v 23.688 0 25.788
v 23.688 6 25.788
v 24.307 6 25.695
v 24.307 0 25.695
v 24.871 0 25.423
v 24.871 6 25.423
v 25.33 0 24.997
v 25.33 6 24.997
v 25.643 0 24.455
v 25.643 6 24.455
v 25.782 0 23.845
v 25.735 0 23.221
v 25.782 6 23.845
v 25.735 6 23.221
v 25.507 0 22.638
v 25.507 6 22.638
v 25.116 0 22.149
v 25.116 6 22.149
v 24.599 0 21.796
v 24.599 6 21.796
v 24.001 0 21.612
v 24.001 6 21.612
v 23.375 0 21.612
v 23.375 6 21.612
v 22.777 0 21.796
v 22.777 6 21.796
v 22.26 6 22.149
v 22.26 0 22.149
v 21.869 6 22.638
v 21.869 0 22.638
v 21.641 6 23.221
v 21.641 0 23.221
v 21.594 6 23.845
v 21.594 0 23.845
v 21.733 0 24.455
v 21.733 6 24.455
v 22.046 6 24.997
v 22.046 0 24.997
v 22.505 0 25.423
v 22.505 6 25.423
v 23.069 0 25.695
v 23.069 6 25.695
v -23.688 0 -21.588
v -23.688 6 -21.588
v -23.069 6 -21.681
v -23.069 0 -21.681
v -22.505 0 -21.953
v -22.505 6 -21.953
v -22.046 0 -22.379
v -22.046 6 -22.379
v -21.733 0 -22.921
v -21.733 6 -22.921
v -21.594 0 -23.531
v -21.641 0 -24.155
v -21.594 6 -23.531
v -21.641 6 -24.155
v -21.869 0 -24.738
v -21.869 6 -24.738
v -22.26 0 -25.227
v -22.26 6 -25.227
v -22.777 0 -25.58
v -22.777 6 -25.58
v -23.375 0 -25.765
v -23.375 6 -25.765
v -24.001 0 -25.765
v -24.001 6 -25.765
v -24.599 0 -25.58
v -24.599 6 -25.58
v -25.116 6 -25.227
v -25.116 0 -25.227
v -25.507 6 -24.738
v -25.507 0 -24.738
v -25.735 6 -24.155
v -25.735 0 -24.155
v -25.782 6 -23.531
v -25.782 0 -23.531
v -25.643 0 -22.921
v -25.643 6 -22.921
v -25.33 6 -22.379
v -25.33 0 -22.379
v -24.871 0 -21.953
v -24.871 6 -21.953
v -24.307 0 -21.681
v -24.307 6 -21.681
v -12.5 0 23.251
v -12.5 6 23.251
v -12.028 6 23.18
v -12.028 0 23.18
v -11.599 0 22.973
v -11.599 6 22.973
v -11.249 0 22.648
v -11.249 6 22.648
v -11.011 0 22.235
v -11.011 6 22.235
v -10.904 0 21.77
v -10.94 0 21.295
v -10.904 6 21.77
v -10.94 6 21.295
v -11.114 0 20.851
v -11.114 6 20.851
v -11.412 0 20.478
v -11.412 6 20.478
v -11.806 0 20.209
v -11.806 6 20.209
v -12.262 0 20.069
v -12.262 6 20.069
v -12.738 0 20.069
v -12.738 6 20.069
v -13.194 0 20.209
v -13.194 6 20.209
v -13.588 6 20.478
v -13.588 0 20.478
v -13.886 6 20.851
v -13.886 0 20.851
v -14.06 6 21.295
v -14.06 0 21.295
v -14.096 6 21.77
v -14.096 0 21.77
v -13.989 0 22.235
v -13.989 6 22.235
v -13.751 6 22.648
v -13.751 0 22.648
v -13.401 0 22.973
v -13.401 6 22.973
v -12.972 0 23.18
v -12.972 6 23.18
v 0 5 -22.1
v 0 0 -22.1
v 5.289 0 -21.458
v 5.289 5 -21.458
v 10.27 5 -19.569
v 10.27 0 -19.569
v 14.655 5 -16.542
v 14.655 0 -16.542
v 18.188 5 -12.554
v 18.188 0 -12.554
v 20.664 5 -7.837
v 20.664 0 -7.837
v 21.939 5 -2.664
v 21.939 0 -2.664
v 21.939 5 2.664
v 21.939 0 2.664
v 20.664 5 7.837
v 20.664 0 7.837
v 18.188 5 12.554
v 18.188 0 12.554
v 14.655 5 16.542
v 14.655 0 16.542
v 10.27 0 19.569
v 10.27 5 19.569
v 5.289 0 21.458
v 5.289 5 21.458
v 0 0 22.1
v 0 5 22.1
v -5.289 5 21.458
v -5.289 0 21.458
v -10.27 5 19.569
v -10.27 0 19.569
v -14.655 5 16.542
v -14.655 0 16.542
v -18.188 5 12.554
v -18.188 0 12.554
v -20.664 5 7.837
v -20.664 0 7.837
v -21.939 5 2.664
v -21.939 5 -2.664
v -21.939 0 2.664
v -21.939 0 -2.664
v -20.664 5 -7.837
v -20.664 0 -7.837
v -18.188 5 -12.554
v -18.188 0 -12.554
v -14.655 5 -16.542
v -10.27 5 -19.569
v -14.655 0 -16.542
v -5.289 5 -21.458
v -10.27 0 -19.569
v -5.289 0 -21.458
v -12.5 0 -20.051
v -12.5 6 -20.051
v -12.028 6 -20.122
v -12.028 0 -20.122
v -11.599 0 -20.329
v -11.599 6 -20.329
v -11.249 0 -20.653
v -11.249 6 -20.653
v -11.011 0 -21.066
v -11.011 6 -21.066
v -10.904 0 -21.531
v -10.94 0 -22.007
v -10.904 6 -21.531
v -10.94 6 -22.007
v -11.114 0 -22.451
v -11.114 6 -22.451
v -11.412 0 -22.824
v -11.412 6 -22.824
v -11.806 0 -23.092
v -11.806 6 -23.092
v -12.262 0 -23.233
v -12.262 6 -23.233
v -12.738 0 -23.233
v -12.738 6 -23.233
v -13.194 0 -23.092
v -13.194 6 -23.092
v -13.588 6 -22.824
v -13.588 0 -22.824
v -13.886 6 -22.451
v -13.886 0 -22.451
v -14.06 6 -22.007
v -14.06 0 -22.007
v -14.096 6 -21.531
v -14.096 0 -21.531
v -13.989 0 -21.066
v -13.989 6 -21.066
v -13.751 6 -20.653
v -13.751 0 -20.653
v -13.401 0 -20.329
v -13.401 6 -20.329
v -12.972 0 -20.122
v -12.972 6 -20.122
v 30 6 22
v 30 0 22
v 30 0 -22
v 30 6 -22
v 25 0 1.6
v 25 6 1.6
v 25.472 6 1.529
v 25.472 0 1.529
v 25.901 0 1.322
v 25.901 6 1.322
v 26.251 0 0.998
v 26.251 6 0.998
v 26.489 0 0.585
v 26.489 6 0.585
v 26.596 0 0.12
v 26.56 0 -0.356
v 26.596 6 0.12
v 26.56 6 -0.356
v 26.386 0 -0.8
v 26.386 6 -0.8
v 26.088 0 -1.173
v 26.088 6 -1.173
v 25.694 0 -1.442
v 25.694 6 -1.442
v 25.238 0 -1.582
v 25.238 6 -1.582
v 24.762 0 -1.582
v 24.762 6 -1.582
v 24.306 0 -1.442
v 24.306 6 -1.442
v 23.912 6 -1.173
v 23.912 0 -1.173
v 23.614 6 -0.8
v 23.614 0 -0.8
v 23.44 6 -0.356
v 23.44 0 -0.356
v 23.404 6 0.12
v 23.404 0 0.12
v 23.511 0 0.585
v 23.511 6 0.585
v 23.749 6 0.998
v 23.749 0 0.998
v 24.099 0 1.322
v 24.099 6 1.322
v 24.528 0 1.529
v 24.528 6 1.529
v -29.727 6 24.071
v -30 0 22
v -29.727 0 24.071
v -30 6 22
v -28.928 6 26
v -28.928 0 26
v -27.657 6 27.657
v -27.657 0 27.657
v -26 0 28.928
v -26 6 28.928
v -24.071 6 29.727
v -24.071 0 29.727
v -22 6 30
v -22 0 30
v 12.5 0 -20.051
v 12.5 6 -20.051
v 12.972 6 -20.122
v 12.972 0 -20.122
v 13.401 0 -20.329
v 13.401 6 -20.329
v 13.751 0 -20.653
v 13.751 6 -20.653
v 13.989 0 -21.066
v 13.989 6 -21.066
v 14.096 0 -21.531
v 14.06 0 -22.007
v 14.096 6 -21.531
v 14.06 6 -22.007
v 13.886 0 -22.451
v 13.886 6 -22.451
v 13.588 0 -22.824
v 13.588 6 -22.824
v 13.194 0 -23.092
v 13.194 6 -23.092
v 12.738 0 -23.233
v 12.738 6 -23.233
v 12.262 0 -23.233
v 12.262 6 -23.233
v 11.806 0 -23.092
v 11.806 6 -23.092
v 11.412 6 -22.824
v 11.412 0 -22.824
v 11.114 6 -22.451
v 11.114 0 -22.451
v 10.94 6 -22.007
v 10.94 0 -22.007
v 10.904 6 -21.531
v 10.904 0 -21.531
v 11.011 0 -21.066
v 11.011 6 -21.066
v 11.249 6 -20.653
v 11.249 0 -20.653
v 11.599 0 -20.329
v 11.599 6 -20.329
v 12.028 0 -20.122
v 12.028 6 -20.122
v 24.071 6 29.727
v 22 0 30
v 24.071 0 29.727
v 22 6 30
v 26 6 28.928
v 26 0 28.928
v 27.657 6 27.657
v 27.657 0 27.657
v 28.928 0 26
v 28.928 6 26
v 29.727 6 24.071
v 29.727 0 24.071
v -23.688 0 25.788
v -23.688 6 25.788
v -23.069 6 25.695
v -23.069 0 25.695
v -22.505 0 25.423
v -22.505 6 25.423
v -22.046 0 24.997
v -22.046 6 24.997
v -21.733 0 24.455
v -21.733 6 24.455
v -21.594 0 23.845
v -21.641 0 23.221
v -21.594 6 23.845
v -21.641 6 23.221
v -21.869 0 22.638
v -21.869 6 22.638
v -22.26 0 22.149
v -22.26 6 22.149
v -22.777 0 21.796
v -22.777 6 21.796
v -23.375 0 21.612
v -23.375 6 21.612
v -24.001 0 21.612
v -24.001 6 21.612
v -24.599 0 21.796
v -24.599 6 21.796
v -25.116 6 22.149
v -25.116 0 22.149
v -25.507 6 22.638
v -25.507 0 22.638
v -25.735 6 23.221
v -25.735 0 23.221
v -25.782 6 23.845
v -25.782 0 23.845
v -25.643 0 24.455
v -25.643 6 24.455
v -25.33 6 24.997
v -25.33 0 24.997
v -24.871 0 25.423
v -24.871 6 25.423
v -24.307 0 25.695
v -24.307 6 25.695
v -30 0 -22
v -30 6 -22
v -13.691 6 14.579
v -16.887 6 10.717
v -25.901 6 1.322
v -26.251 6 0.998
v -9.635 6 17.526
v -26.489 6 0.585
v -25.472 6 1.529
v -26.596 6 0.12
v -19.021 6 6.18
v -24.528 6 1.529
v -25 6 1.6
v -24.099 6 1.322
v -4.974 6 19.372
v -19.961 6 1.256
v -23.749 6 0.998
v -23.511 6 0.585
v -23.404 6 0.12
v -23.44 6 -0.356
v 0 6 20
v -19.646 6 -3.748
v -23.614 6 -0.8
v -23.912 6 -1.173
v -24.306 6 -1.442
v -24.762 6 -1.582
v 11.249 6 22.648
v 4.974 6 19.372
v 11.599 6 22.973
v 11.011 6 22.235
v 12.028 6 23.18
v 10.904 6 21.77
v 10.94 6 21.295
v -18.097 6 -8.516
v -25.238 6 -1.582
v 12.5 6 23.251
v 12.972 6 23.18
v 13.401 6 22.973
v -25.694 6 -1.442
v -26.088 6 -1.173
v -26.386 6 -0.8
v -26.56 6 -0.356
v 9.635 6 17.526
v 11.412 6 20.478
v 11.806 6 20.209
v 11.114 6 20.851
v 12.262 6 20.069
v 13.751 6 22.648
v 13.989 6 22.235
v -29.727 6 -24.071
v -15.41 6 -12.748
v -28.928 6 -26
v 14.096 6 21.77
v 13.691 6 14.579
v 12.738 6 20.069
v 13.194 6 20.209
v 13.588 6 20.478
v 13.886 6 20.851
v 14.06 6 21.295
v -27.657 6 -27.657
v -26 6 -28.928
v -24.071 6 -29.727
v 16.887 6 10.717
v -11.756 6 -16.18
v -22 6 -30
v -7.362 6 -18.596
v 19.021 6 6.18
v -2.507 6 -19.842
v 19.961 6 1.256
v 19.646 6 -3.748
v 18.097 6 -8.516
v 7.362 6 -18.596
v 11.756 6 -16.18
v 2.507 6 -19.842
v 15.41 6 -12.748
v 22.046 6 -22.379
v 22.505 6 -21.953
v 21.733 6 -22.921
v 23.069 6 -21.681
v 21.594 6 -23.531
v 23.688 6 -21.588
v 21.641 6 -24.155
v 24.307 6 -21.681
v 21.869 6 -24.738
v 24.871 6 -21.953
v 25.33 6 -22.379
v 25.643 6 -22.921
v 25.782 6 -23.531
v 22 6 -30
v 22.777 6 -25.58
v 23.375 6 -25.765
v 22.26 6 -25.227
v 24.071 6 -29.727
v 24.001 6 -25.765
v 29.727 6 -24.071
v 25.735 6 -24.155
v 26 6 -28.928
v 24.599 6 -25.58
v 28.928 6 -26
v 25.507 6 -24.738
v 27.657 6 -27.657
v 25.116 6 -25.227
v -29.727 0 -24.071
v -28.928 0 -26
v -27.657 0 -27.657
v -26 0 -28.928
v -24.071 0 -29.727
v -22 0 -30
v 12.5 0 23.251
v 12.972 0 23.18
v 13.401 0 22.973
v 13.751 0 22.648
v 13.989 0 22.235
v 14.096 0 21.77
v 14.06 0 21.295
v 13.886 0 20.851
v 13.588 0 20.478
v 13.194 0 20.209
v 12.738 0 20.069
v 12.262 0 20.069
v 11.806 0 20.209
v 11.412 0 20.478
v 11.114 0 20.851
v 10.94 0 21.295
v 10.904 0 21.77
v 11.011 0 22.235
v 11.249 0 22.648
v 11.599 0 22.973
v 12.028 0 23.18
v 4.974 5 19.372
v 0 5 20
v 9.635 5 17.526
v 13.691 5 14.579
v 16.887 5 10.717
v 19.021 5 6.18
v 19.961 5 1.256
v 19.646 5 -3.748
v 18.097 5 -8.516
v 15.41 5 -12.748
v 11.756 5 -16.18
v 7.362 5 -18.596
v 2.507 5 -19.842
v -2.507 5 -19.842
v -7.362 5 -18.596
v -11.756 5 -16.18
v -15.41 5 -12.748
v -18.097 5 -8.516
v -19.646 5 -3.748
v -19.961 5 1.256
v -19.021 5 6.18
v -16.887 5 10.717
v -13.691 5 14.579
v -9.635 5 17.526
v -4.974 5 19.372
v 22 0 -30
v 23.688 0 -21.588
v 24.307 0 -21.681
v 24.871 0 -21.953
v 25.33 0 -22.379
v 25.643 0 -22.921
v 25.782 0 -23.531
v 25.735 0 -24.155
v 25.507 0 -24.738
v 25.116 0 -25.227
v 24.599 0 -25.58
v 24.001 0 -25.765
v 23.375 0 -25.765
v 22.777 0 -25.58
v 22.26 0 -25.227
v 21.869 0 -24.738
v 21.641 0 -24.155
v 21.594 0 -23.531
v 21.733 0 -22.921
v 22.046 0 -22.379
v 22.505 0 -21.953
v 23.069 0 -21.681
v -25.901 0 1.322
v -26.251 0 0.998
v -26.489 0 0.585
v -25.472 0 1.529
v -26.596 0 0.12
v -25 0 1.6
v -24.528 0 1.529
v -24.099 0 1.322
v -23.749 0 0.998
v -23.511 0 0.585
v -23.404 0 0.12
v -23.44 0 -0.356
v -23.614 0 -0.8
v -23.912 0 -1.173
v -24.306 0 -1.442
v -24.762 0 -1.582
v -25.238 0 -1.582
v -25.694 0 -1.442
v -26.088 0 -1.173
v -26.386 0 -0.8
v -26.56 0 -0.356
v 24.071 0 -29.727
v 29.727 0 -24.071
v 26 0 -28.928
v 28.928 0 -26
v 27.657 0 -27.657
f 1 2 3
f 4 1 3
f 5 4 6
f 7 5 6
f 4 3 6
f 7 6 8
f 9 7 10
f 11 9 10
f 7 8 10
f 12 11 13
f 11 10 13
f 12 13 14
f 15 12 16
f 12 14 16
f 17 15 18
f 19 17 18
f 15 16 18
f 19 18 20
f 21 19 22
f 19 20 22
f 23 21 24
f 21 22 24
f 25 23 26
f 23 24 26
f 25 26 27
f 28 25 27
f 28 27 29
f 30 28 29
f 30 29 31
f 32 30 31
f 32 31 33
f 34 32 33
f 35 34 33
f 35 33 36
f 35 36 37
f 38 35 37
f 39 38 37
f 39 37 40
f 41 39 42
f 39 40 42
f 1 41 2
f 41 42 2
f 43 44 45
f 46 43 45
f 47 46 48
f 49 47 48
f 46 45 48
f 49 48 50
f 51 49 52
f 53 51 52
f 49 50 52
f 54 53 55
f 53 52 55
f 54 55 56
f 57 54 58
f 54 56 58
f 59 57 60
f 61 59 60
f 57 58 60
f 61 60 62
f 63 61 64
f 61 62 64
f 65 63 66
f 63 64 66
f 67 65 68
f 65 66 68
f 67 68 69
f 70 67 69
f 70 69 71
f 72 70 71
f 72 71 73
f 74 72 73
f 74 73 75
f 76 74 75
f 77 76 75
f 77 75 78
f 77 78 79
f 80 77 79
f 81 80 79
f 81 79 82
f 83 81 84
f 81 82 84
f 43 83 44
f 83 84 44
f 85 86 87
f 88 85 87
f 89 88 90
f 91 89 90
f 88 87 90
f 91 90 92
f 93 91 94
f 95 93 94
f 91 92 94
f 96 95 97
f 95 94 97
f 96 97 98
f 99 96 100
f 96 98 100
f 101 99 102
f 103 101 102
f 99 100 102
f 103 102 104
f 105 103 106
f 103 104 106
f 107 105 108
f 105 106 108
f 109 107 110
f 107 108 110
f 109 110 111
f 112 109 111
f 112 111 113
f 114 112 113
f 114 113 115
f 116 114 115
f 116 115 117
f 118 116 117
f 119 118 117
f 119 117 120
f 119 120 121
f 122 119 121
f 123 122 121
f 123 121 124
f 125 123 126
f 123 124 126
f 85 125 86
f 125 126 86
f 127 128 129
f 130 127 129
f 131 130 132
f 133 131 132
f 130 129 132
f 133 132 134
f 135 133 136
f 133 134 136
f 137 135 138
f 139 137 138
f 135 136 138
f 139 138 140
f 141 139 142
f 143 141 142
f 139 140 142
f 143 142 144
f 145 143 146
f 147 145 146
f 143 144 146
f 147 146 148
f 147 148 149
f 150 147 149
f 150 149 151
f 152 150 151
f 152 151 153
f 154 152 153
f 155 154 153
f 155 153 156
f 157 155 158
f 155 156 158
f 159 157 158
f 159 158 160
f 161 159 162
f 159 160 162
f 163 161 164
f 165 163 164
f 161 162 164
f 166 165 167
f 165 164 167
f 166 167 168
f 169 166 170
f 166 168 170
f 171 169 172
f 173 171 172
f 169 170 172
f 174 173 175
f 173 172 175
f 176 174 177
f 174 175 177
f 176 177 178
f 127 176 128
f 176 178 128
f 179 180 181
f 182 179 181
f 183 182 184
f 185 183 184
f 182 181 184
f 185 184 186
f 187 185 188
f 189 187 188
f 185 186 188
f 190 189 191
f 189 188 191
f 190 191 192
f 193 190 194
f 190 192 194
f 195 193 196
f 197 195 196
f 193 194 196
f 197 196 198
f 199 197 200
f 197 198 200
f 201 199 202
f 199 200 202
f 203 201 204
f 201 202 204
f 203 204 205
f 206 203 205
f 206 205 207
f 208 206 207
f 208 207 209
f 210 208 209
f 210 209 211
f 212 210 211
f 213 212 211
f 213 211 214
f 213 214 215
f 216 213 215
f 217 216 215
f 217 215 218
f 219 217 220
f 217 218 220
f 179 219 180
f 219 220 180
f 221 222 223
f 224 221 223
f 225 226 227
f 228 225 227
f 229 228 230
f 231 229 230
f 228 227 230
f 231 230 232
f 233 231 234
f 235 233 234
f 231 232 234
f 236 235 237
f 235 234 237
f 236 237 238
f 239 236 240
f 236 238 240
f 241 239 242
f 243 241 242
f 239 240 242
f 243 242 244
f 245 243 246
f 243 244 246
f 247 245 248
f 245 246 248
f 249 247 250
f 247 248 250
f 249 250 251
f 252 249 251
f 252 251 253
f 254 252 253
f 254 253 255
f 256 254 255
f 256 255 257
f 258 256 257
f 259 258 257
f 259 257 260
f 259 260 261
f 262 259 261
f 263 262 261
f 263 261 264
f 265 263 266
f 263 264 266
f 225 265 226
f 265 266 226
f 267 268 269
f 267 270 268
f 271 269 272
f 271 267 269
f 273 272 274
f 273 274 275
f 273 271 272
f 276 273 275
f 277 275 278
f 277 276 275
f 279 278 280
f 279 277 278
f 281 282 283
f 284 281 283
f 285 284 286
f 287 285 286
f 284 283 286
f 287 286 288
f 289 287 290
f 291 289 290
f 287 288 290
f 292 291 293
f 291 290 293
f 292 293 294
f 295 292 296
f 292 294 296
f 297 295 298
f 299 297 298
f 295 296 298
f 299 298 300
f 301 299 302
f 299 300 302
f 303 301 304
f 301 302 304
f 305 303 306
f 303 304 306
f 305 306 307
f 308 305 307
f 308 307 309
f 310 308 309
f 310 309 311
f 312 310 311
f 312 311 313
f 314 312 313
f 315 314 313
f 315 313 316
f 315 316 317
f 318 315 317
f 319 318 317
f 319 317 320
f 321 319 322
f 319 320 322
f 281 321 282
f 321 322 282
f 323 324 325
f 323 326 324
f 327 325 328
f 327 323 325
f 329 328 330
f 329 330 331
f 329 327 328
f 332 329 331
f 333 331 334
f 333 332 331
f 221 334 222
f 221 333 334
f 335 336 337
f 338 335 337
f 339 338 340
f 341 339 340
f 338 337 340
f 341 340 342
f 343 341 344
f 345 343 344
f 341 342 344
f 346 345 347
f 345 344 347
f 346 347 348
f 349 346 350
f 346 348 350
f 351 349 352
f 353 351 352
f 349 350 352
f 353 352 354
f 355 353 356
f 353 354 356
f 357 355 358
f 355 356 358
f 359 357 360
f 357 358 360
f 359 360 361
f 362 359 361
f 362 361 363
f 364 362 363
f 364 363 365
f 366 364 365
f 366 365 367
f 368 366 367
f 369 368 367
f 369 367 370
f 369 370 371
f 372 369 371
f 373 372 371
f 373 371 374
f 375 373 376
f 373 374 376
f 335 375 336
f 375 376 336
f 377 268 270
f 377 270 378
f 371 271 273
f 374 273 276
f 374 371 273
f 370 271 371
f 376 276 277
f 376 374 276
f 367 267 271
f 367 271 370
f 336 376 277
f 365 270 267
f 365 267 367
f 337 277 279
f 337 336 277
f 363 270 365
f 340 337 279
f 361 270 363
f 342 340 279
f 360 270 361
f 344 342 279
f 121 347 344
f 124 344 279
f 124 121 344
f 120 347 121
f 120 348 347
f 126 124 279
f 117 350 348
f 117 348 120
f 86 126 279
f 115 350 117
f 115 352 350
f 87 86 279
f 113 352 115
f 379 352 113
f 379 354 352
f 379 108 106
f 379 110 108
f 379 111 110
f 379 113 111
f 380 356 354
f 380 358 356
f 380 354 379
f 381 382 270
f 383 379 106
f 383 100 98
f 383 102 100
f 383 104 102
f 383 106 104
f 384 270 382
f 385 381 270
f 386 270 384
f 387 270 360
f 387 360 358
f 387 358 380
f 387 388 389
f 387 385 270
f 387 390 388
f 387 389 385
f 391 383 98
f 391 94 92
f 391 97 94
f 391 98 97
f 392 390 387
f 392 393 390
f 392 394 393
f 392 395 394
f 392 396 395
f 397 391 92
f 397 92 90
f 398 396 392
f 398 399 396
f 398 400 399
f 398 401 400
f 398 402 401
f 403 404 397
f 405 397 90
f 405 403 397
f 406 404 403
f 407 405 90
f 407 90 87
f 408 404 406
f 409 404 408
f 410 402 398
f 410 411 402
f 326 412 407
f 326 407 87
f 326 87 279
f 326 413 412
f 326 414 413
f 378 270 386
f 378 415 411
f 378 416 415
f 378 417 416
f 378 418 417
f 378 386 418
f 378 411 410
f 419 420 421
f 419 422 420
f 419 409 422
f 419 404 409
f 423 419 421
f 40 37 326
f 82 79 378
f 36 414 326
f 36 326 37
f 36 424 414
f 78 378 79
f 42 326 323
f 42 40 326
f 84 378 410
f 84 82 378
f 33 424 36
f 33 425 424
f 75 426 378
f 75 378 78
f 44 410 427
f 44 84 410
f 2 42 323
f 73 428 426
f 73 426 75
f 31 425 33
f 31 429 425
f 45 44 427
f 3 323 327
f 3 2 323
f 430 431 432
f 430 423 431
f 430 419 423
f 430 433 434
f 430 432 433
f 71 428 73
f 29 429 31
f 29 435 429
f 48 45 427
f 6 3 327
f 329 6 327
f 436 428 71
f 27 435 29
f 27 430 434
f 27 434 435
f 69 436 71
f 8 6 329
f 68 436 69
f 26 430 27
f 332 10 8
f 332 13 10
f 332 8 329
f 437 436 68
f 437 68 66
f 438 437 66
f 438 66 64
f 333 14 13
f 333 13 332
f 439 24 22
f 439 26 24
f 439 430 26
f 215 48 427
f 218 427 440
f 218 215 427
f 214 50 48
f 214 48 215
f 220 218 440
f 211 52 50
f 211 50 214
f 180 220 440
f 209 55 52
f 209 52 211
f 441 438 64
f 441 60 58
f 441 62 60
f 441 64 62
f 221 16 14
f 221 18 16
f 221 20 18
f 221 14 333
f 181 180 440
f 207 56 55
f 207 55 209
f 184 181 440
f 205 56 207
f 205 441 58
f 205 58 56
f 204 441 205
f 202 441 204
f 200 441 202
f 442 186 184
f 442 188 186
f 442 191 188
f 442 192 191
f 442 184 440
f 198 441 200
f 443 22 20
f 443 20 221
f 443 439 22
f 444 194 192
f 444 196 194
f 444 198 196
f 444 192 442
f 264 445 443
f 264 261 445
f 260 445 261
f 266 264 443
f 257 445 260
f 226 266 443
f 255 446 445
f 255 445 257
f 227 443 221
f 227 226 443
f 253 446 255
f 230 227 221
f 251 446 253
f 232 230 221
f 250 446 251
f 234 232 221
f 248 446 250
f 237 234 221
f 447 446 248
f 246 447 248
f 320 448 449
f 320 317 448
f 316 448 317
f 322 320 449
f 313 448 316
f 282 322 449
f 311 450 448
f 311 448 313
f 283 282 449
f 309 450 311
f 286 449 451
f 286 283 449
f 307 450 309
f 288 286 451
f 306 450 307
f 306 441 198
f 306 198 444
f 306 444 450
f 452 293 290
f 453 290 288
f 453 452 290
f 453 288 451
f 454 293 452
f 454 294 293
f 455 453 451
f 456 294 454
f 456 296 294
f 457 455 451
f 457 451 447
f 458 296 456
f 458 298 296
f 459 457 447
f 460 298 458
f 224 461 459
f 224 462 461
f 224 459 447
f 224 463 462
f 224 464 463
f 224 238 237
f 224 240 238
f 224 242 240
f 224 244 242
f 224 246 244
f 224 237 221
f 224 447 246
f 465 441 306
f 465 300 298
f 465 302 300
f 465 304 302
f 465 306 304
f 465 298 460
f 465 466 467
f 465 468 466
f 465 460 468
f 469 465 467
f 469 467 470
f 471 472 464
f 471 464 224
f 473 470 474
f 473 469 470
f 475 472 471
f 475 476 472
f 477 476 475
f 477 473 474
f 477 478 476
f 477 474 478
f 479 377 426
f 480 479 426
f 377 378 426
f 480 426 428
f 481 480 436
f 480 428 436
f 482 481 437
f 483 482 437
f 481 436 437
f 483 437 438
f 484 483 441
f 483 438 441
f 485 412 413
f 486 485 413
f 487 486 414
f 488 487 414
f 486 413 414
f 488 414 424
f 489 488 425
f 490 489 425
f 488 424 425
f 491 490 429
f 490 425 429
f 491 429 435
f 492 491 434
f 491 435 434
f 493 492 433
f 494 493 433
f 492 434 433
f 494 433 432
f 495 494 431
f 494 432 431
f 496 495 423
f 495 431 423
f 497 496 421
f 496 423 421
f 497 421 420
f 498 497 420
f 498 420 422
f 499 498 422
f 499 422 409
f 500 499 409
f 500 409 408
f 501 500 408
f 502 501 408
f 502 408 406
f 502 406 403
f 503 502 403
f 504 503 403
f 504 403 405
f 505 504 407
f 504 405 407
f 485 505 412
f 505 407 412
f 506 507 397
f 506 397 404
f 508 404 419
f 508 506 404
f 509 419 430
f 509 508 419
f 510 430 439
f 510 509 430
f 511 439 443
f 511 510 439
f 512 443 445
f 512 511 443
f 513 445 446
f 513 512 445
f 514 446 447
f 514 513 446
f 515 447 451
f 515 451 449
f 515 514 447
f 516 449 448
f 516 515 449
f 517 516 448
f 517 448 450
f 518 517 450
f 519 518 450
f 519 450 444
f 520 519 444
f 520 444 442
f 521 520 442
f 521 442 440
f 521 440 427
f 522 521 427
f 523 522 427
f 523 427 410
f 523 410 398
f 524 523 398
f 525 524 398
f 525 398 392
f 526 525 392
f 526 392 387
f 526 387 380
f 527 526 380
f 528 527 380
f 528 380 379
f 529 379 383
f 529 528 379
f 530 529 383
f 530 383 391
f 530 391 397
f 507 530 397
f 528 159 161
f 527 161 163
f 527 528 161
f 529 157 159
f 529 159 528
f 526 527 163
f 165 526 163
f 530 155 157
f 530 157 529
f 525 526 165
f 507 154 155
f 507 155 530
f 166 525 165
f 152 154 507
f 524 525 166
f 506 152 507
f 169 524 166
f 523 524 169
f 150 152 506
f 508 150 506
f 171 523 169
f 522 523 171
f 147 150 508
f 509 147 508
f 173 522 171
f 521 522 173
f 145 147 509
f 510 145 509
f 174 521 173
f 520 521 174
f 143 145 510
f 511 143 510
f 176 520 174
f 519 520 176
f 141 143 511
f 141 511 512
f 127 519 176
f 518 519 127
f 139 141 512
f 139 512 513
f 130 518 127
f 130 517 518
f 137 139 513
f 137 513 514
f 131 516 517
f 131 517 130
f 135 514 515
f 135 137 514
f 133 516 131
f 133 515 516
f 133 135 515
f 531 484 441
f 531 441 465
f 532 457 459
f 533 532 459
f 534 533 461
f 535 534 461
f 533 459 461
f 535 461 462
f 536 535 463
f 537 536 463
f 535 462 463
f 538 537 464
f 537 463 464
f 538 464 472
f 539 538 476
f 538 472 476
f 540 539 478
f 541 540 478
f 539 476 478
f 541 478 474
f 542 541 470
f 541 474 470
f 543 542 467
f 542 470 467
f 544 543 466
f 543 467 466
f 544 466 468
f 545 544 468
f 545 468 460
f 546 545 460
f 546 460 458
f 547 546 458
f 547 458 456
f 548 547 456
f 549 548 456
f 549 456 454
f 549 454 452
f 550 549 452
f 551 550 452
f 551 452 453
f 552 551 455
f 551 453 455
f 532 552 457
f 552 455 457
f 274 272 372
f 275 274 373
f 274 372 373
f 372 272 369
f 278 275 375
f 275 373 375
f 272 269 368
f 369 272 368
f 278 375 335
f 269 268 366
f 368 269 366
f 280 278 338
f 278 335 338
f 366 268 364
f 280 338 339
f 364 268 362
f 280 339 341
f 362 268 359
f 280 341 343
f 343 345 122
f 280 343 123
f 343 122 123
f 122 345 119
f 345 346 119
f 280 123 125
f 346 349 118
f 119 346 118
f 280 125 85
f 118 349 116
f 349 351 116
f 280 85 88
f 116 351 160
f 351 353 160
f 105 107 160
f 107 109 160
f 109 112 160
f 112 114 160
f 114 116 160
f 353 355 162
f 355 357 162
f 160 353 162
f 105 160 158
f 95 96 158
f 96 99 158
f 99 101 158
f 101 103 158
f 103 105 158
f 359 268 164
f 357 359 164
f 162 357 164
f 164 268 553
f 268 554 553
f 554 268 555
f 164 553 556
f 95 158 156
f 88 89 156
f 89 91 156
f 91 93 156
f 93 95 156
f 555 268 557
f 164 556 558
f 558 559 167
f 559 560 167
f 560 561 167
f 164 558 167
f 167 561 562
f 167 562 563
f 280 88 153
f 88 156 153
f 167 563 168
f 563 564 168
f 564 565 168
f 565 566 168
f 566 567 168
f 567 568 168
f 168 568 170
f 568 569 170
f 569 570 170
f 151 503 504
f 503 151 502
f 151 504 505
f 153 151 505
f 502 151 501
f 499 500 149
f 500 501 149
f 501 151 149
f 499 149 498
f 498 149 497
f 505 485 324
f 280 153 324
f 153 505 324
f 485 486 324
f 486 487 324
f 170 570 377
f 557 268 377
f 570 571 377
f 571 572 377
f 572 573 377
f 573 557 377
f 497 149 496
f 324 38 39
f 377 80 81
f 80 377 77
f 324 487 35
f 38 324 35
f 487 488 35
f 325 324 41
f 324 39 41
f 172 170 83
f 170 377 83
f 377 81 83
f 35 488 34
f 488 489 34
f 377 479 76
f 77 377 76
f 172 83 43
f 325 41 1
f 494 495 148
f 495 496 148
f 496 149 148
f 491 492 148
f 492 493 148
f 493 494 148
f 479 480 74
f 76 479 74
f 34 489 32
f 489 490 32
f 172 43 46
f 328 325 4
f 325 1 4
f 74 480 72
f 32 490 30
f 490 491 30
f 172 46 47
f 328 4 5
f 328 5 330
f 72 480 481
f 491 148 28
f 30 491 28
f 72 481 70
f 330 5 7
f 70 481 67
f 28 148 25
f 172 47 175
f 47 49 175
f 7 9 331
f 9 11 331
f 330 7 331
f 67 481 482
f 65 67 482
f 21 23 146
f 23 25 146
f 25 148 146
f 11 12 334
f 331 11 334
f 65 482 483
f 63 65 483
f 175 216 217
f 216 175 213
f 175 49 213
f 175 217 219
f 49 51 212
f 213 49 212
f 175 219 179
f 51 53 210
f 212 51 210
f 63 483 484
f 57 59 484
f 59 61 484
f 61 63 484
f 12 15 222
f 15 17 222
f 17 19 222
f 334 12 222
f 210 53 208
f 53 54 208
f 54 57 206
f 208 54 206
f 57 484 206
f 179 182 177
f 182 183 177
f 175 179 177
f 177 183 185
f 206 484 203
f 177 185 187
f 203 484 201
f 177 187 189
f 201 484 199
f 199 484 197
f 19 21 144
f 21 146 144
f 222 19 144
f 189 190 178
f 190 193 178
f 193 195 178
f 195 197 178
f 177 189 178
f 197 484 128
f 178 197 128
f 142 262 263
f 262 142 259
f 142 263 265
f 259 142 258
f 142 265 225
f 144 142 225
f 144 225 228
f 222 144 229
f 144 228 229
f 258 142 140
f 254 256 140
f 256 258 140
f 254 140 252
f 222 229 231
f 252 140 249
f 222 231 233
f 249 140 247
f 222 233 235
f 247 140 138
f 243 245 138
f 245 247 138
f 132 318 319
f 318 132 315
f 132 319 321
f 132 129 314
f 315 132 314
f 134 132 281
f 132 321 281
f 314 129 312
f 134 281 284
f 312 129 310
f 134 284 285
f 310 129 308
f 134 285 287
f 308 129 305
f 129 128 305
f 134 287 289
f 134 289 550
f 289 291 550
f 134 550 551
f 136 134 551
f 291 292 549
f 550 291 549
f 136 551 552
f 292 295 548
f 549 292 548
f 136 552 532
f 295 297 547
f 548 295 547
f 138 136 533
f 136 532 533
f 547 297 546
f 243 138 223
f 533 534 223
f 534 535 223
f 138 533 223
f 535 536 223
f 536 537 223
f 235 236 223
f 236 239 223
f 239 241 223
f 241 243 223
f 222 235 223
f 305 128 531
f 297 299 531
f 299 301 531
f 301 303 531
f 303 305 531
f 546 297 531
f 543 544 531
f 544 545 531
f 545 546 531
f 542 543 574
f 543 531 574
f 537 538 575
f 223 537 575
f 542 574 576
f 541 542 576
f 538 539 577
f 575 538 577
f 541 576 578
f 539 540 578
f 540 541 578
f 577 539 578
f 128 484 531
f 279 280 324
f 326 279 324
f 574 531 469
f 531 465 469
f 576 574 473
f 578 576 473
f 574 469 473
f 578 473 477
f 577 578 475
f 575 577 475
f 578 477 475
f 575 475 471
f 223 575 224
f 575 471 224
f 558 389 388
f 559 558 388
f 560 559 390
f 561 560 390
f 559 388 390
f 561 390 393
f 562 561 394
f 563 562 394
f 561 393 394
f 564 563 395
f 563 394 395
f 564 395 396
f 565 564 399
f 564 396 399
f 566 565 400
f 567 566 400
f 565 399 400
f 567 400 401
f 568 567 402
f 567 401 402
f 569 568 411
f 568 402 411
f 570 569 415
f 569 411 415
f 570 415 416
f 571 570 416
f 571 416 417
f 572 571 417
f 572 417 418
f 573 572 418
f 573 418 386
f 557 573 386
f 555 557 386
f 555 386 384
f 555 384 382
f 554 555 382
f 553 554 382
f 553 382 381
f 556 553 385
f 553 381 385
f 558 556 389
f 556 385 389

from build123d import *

# Parameters (mm, degrees)
SKETCH_1_W          = 60
SKETCH_1_H          = 60
SKETCH_1_R          = 20
EXTRUDE_1_DEPTH     = 6
SKETCH_3_R          = 22.1
CUT_EXTRUDE_1_DEPTH = 5
SKETCH_4_R          = 1.6
SKETCH_4_R_2        = 2.1
CUT_EXTRUDE_2_DEPTH = 6
FILLET_1_R          = 8


with BuildPart() as part:
    # 草图1 → 凸台-拉伸1 (new body)
    with BuildSketch(Plane(origin=(0, 0, 0), x_dir=(1, 0, 0), z_dir=(0, 1, 0))):
        Rectangle(SKETCH_1_W, SKETCH_1_H)
        with Locations(Location((0, 0, 0), (0, 0, 270))):
            Circle(SKETCH_1_R, mode=Mode.SUBTRACT)
    extrude(amount=EXTRUDE_1_DEPTH)

    # 草图3 → 切除-拉伸1 (cut)
    with BuildSketch(Plane.XZ):
        with Locations(Location((0, 0, 0), (0, 0, 270))):
            Circle(SKETCH_3_R)
    extrude(amount=-CUT_EXTRUDE_1_DEPTH, mode=Mode.SUBTRACT)

    # 草图4 → 切除-拉伸2 (cut)
    with BuildSketch(Plane(origin=(0, 6, 0), x_dir=(1, 0, 0), z_dir=(0, 1, 0))):
        with Locations(Location((25, 0, 0), (0, 0, 270))):
            Circle(SKETCH_4_R)
        with Locations(Location((12.5, -21.650635095, 0), (0, 0, 270))):
            Circle(SKETCH_4_R)
        with Locations(Location((-12.5, -21.650635095, 0), (0, 0, 270))):
            Circle(SKETCH_4_R)
        with Locations(Location((-25, 0, 0), (0, 0, 270))):
            Circle(SKETCH_4_R)
        with Locations(Location((-12.5, 21.650635095, 0), (0, 0, 270))):
            Circle(SKETCH_4_R)
        with Locations(Location((12.5, 21.650635095, 0), (0, 0, 270))):
            Circle(SKETCH_4_R)
        with Locations(Location((23.68807717, 23.68807717, 0), (0, 0, 270))):
            Circle(SKETCH_4_R_2)
        with Locations(Location((23.68807717, -23.68807717, 0), (0, 0, 270))):
            Circle(SKETCH_4_R_2)
        with Locations(Location((-23.68807717, -23.68807717, 0), (0, 0, 270))):
            Circle(SKETCH_4_R_2)
        with Locations(Location((-23.68807717, 23.68807717, 0), (0, 0, 270))):
            Circle(SKETCH_4_R_2)
    extrude(amount=-CUT_EXTRUDE_2_DEPTH, mode=Mode.SUBTRACT)

    # 圆角1
    fillet_1_edges = [part.edges().sort_by_distance(p)[0] for p in [
        (30, 3, 30),
        (-30, 3, 30),
        (-30, 3, -30),
        (30, 3, -30),
    ]]
    fillet(fillet_1_edges, radius=FILLET_1_R)


solid = part.part
